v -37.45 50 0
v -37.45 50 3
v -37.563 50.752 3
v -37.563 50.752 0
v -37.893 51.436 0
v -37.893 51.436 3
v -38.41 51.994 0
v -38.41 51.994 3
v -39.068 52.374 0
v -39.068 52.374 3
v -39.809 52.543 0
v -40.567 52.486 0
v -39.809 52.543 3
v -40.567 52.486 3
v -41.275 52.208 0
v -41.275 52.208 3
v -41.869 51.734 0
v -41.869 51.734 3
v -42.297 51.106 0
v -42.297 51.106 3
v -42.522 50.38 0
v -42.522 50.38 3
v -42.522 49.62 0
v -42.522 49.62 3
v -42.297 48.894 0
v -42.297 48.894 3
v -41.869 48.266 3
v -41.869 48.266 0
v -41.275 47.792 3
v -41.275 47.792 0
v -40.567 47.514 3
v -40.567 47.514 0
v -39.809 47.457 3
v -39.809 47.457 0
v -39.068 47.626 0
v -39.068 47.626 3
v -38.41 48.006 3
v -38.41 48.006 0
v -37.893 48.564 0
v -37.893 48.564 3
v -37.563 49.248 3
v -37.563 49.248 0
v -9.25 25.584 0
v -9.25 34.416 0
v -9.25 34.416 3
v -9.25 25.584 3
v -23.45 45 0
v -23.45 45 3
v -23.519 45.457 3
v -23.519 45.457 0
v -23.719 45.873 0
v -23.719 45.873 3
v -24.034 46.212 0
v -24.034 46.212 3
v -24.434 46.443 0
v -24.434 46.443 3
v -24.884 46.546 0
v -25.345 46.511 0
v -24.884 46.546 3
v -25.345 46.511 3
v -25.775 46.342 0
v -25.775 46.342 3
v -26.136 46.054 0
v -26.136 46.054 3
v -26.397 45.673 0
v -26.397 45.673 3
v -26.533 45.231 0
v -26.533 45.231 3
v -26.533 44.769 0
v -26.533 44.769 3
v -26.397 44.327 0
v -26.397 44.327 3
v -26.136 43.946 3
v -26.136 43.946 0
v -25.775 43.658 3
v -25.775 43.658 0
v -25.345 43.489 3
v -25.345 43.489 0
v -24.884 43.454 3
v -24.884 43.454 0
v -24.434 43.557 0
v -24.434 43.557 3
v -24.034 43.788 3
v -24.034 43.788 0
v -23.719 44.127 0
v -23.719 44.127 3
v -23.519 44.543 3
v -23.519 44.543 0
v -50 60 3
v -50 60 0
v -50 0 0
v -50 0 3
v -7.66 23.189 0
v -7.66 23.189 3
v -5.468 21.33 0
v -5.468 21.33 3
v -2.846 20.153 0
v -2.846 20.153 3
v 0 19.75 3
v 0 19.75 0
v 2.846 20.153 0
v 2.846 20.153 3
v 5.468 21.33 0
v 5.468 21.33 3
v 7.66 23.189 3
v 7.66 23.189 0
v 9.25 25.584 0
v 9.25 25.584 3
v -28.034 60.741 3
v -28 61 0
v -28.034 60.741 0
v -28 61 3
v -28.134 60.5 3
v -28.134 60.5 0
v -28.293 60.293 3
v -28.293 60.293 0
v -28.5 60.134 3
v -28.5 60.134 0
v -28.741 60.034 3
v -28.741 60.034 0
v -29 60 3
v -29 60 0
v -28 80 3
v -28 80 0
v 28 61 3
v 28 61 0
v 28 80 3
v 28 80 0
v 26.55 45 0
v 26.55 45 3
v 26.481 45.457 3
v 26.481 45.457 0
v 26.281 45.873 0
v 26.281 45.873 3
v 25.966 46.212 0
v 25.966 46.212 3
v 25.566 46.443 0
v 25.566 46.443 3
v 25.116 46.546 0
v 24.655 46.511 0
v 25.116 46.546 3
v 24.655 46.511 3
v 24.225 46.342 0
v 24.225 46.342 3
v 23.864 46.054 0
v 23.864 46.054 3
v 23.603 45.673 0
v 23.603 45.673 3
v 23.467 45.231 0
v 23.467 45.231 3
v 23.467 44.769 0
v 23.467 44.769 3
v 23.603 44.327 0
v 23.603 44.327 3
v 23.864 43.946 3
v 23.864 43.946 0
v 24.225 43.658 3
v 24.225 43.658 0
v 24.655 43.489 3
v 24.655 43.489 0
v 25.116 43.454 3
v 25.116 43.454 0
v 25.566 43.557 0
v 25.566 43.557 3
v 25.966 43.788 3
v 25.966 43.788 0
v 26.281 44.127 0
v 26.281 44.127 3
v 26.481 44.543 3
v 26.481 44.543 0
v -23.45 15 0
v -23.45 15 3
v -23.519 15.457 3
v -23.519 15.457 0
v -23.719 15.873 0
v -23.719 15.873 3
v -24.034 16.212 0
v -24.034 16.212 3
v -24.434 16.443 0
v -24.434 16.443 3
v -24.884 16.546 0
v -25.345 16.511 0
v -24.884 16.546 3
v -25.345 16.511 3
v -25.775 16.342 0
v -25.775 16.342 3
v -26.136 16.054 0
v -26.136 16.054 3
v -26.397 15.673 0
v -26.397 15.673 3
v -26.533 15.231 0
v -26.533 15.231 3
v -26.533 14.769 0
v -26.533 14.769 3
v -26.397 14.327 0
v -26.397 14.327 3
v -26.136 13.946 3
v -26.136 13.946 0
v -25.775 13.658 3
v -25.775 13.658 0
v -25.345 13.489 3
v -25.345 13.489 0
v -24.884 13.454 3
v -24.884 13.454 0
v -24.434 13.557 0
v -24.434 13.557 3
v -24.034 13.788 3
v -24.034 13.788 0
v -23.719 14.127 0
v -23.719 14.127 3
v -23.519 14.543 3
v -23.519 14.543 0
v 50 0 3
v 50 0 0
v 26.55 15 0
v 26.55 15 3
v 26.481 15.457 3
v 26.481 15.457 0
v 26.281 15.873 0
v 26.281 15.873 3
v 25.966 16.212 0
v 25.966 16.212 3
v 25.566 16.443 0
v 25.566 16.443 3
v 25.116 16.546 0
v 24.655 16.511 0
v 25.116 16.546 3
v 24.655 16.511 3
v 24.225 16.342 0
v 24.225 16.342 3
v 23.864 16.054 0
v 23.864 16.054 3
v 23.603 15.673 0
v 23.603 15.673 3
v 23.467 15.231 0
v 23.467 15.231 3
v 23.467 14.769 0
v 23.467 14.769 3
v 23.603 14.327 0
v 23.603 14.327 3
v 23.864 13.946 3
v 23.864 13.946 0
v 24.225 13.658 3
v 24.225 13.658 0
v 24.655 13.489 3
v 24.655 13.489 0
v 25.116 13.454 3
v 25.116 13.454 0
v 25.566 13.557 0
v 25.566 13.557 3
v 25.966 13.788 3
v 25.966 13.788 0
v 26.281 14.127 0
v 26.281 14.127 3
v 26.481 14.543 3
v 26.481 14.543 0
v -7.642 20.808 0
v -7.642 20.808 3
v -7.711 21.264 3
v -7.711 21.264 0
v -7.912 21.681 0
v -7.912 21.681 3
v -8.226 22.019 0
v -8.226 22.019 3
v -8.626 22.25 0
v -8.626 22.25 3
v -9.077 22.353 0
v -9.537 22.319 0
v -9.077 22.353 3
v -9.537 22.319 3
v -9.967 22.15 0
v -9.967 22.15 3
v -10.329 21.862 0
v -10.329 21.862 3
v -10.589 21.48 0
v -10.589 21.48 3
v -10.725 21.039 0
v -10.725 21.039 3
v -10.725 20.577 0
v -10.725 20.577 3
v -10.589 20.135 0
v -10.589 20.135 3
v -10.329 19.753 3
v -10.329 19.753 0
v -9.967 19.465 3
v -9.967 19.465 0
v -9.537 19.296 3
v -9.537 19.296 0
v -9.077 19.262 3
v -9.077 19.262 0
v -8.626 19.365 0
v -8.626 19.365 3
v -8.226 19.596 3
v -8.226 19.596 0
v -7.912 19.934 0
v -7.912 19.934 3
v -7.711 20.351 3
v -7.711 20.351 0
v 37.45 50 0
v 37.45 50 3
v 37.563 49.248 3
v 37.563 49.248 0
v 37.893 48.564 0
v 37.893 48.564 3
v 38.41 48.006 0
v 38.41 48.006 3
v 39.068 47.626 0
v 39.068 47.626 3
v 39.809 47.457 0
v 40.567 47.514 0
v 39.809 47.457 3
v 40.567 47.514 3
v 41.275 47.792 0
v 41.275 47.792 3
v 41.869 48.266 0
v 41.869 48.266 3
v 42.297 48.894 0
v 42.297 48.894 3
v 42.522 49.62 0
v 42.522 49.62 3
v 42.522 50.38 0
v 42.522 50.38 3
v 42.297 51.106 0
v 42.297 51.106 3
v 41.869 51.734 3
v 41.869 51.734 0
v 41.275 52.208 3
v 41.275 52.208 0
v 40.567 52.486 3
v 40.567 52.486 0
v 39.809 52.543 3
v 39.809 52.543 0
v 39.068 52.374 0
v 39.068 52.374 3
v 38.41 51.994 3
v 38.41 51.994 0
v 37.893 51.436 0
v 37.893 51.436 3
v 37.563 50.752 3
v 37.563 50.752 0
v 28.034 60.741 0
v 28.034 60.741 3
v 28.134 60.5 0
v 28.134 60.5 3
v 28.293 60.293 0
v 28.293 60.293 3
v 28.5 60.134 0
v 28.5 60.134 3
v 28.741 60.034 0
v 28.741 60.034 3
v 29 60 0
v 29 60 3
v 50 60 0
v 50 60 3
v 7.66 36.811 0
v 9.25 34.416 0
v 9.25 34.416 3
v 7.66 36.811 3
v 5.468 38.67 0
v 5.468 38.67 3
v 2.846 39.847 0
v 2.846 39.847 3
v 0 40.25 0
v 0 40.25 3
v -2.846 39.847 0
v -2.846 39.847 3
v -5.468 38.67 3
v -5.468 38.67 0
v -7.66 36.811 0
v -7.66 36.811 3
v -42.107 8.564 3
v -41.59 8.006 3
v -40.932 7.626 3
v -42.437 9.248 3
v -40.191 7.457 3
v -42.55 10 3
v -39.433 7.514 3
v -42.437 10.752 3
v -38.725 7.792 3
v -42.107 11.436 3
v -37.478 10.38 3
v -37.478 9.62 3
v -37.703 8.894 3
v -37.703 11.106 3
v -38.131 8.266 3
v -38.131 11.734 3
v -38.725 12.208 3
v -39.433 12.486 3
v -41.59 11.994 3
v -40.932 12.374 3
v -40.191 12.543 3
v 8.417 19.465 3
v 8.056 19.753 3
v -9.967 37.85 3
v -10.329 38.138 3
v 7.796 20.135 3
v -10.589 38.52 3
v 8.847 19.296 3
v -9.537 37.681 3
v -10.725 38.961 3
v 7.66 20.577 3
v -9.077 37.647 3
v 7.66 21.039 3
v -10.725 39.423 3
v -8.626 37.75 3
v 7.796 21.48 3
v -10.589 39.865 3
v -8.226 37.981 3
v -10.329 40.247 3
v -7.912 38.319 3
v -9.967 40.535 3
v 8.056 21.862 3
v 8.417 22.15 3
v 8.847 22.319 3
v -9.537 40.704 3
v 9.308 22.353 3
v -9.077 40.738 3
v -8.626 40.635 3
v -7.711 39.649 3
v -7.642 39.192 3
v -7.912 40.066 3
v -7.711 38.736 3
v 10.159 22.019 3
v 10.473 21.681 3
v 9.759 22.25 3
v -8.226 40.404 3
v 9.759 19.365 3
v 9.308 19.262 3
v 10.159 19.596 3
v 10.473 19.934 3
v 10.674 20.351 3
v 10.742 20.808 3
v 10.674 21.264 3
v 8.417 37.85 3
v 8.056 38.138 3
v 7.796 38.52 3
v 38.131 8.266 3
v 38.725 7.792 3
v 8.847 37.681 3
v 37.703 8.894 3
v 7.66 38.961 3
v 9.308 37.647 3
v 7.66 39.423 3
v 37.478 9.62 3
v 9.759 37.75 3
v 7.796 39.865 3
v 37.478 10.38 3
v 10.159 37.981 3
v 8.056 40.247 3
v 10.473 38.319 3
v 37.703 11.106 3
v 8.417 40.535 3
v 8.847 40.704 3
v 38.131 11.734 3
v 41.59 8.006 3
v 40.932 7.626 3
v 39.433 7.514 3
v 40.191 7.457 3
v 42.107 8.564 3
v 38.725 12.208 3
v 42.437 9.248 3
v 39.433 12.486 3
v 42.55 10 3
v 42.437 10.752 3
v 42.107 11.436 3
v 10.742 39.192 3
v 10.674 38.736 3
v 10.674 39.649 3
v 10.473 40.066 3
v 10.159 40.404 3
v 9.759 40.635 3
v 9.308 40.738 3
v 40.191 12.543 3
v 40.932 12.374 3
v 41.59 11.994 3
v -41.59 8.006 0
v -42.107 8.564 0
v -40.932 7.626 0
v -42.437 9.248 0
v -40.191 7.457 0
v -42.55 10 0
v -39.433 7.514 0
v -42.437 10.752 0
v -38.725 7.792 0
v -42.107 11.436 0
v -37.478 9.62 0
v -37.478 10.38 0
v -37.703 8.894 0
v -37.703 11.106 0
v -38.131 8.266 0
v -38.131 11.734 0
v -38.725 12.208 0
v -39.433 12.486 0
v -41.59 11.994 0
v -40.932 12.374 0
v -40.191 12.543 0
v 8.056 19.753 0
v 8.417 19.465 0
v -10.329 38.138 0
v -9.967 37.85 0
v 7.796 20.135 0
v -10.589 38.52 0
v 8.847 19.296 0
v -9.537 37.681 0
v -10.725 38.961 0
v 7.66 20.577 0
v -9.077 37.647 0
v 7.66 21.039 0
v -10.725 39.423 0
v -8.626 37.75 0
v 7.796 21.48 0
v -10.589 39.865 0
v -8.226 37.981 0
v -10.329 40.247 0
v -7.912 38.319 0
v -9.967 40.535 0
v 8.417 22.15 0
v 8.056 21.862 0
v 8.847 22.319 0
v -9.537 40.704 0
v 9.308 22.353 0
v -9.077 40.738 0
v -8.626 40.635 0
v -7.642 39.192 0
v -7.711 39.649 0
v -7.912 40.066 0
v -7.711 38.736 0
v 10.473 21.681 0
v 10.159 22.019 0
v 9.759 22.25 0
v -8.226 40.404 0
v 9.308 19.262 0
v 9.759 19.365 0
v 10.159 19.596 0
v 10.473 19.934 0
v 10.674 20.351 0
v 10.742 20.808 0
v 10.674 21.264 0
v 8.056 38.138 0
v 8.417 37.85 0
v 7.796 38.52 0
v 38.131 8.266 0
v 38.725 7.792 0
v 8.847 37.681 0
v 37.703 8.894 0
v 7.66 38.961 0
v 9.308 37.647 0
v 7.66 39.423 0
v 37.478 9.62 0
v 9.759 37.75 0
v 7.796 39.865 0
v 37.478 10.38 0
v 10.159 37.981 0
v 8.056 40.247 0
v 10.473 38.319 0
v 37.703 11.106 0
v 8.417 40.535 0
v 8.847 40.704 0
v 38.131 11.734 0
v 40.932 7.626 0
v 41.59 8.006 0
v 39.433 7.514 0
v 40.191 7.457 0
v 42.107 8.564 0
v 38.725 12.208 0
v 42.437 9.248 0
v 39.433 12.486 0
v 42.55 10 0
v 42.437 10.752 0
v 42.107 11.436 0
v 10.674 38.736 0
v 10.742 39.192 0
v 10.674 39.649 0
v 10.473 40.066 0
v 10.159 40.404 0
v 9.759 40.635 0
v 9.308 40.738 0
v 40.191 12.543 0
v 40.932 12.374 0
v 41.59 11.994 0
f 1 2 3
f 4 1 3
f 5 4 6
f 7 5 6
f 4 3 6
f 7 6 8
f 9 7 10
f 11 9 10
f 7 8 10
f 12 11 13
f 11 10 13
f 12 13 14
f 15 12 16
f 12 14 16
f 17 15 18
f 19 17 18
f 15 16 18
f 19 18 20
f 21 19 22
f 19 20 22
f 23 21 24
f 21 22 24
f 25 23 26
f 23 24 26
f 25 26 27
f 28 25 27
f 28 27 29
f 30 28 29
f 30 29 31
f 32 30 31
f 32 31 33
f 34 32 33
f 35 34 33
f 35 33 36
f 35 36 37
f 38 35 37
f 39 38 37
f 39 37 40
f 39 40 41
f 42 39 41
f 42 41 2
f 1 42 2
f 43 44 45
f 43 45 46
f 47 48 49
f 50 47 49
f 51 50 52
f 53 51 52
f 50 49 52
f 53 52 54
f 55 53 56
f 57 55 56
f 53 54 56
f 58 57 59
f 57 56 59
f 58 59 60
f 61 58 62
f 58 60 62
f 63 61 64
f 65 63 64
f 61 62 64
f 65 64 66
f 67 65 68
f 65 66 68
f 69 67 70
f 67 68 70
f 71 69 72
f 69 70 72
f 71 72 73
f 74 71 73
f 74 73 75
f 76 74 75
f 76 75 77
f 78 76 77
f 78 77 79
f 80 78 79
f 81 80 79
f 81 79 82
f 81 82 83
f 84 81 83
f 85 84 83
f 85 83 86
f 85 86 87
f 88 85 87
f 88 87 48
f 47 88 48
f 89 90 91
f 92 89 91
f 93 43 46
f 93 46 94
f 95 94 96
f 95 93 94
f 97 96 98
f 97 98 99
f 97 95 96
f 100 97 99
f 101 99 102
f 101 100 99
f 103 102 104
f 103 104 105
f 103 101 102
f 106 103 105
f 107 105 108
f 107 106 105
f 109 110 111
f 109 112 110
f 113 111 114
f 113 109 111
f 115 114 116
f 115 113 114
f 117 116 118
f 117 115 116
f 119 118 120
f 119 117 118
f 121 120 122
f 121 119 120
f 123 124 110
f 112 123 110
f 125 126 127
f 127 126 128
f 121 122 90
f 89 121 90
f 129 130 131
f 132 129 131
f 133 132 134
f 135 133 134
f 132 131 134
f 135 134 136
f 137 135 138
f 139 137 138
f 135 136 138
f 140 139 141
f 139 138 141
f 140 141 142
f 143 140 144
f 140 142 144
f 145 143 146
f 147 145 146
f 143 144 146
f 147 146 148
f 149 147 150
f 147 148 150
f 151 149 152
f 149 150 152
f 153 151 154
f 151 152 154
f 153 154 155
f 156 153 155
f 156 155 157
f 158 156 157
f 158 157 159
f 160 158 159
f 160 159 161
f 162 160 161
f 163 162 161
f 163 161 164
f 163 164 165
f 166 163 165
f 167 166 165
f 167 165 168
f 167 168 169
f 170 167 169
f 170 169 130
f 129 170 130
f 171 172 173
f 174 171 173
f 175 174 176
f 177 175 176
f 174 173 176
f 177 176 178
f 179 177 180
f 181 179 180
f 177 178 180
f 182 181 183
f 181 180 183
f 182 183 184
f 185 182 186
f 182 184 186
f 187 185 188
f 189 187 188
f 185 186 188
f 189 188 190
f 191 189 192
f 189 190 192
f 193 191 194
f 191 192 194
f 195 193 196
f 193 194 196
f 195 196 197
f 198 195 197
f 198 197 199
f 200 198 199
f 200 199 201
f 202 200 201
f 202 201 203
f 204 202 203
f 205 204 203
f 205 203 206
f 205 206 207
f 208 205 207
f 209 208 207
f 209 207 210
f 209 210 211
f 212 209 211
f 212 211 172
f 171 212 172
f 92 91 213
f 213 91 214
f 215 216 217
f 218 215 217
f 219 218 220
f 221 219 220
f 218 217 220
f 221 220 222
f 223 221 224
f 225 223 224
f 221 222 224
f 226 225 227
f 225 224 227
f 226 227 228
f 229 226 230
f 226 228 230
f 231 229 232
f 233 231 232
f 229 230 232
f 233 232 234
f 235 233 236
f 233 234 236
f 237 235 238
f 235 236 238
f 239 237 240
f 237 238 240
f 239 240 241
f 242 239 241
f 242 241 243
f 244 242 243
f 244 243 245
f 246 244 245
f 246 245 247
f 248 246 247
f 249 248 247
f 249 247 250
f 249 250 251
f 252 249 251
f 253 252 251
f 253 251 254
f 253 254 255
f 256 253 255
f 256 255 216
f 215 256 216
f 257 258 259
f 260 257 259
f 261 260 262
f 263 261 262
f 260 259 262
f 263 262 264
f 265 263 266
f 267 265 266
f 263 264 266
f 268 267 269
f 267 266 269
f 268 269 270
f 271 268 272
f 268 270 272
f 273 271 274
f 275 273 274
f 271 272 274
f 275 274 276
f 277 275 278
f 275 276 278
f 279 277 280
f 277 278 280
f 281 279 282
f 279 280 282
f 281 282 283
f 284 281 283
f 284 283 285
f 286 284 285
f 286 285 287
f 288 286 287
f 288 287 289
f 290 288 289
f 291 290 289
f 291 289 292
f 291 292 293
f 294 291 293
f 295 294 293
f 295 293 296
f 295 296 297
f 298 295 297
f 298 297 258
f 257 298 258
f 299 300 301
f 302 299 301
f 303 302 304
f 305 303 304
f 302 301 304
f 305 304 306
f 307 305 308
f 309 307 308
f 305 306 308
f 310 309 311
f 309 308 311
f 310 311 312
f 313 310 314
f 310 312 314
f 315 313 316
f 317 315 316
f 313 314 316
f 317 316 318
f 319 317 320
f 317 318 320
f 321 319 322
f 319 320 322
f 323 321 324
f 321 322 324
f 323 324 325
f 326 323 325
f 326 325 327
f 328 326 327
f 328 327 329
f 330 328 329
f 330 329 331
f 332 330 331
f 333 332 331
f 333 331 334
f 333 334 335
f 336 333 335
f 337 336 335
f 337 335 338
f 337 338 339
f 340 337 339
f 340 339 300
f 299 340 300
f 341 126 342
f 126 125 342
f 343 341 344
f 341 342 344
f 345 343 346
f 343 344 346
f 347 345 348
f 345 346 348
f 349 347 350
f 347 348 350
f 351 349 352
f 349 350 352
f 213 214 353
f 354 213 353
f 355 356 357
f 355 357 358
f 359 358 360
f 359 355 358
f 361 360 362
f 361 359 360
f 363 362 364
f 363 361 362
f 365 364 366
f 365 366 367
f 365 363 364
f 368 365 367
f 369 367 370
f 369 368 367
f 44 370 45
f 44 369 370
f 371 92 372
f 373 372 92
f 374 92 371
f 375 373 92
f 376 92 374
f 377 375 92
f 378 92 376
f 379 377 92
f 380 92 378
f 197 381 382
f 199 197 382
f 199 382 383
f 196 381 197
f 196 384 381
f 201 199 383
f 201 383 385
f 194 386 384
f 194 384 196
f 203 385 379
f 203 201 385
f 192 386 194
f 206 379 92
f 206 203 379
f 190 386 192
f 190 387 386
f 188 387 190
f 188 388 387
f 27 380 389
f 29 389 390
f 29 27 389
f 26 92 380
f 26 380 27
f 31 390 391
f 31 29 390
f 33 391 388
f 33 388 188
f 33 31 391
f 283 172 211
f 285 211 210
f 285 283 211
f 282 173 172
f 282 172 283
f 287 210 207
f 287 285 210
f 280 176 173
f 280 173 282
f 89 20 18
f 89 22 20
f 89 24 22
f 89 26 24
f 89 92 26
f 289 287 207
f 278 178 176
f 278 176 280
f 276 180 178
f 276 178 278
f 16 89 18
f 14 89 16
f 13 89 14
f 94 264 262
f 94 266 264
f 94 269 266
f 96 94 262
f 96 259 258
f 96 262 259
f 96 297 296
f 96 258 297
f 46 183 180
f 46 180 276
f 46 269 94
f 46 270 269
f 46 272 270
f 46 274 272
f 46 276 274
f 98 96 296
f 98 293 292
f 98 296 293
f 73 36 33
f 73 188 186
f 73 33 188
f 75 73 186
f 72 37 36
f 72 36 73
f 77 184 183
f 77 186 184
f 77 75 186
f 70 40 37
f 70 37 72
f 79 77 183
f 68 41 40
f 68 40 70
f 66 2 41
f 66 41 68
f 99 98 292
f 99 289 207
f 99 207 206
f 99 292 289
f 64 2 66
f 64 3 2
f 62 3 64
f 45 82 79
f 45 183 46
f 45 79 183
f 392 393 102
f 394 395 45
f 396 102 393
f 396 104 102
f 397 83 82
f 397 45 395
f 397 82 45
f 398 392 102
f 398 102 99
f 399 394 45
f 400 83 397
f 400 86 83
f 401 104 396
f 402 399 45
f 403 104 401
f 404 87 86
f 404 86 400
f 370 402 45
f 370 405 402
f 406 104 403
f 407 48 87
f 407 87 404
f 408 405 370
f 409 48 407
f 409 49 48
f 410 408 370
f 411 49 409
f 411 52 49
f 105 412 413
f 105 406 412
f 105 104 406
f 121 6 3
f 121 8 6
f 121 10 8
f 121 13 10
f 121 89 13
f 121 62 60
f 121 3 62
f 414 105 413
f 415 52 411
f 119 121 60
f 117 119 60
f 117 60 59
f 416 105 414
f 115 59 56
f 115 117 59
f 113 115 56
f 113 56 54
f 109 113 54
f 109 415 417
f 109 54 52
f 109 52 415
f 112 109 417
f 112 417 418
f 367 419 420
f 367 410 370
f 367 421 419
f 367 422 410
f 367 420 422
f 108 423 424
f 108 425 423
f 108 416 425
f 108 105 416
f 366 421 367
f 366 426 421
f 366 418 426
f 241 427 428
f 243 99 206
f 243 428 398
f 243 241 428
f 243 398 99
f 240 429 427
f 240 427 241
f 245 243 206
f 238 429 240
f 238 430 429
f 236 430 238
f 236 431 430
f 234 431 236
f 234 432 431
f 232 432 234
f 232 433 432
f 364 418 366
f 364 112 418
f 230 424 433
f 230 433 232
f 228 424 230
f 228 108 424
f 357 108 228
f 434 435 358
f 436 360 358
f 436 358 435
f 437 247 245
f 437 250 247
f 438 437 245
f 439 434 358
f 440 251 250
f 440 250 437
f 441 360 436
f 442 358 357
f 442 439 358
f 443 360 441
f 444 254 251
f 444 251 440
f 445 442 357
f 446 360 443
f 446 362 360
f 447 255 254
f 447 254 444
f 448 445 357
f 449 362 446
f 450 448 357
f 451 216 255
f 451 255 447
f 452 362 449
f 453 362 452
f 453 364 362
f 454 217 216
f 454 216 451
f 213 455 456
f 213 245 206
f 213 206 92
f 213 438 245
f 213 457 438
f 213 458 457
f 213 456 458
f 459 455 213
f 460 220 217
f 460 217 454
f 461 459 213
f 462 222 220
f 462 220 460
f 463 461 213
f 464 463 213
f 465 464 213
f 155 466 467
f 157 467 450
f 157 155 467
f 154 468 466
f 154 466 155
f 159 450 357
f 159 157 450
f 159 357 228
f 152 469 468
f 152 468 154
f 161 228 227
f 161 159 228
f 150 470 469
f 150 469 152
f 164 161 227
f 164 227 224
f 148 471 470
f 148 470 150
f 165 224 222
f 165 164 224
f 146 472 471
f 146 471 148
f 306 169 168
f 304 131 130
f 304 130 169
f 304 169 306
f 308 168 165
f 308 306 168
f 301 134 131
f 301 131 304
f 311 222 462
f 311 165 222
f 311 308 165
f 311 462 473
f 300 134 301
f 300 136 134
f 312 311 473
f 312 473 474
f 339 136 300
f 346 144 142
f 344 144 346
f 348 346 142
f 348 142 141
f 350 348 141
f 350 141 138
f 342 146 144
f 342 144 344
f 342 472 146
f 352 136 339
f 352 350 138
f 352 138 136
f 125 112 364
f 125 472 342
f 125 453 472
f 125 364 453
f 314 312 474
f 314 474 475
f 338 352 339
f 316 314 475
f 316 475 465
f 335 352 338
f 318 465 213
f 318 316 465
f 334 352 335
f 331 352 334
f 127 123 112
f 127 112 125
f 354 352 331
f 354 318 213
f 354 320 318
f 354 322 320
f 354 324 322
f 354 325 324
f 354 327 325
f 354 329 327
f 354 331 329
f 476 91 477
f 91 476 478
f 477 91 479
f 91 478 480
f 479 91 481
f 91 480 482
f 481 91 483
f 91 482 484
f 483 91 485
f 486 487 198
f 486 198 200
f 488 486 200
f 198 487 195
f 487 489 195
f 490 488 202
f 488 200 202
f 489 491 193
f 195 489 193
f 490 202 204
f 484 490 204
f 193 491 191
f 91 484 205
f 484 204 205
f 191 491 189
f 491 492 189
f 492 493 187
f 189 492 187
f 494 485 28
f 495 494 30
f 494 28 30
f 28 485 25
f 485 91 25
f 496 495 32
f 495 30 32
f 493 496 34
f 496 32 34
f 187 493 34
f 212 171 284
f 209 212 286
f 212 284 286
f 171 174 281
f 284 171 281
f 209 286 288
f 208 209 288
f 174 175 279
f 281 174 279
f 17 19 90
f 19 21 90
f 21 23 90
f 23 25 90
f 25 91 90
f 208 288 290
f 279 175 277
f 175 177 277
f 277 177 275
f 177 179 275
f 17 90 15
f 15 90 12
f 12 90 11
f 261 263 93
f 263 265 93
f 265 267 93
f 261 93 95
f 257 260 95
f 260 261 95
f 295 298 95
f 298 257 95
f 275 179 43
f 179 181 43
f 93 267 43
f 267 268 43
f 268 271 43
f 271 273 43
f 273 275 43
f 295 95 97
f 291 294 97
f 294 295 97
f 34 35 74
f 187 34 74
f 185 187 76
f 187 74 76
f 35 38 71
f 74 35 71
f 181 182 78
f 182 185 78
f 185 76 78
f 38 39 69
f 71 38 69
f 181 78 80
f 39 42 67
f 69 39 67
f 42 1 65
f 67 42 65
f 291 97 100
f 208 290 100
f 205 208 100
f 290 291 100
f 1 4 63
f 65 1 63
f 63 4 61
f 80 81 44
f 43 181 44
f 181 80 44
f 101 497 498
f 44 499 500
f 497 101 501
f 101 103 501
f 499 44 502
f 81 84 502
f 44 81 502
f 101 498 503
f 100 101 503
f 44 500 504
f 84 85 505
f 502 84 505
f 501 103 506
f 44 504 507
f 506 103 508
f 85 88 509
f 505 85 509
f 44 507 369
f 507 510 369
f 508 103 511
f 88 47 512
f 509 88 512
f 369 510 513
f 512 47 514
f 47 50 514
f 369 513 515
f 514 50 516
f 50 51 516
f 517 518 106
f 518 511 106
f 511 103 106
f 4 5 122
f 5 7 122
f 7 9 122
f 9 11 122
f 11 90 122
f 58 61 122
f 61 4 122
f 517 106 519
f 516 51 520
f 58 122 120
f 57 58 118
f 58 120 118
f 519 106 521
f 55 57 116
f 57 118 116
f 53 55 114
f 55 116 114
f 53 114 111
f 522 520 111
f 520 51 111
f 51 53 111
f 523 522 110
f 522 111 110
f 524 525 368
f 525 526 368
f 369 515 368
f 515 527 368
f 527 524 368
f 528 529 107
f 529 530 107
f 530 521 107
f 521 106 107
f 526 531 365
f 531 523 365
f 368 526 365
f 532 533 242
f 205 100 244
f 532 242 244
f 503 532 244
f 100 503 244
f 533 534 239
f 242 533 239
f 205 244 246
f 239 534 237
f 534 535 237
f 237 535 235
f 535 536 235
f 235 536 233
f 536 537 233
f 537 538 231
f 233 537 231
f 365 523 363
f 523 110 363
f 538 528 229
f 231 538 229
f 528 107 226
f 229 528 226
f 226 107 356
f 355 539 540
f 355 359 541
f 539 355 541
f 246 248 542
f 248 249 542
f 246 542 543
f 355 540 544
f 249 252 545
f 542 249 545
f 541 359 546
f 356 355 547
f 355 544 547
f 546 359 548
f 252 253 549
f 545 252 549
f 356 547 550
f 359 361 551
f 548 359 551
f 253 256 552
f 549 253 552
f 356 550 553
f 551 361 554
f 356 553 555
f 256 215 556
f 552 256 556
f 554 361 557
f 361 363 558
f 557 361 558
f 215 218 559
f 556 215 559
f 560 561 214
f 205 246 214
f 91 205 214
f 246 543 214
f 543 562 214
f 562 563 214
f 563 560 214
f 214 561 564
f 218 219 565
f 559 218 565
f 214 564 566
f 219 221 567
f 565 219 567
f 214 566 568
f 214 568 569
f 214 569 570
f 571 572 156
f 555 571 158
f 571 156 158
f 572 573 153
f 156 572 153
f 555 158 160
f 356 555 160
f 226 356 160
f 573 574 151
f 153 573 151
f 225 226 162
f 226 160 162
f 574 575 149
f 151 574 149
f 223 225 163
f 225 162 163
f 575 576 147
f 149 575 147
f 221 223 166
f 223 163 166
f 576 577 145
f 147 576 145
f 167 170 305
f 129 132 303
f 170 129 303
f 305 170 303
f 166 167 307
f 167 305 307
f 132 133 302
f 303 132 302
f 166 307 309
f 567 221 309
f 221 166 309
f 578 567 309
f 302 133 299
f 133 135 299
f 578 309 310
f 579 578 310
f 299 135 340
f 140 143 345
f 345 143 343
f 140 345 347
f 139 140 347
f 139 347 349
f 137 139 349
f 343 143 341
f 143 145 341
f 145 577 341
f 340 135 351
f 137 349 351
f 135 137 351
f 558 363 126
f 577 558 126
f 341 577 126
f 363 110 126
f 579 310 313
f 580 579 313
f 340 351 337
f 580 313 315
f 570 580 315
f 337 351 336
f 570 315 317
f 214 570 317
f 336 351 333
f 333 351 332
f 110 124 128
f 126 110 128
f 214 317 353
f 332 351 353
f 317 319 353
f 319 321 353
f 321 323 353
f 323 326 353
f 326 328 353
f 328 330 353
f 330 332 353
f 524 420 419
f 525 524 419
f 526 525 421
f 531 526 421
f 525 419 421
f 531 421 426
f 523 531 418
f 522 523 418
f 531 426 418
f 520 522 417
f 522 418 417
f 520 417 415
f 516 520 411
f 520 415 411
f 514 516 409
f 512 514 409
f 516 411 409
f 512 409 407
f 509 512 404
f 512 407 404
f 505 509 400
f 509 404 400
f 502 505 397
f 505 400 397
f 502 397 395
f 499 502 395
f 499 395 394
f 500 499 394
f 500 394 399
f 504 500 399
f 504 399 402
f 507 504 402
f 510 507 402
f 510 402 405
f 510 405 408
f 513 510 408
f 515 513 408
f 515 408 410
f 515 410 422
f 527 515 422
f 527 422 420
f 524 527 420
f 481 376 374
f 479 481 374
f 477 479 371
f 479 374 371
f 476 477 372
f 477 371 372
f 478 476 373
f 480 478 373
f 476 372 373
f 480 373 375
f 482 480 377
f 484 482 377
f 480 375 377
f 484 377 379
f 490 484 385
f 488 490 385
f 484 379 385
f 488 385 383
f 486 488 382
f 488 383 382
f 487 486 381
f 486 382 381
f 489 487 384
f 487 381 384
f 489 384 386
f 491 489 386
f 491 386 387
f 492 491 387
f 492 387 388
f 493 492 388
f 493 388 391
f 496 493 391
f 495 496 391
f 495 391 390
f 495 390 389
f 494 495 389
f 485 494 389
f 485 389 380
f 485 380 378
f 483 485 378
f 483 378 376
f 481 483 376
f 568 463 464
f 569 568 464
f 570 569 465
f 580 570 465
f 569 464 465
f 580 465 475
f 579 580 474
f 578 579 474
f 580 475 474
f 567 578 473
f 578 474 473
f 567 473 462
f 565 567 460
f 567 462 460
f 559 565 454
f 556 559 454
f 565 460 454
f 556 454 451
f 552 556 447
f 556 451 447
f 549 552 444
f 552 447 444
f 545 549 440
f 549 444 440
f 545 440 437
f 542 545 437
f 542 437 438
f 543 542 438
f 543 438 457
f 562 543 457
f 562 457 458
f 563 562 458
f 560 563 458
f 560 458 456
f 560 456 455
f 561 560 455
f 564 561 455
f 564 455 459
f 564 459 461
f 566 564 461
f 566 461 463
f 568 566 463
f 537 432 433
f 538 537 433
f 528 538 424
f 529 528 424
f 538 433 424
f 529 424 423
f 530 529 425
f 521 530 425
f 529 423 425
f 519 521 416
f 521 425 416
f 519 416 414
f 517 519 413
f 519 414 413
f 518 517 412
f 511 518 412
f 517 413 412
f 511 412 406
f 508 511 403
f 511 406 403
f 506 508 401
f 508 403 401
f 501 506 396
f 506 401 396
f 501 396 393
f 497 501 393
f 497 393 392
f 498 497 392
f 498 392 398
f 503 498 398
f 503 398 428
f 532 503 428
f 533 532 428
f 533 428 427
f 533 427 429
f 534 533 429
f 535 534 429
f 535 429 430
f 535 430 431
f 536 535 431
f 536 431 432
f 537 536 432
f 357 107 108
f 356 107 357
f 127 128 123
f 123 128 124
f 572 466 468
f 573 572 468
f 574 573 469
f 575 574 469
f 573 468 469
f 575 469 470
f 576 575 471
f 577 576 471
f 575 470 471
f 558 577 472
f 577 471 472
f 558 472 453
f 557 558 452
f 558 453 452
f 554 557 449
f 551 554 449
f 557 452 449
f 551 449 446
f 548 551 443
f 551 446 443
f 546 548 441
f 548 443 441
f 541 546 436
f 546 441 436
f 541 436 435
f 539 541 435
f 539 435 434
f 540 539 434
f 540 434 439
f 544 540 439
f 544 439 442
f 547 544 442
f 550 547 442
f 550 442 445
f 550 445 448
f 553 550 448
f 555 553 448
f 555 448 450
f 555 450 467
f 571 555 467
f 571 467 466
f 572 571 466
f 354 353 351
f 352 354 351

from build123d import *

# Parameters (mm, degrees)
EXTRUDE_1_DEPTH     = 3
SKETCH_2_R          = 1.55
CUT_EXTRUDE_1_DEPTH = 95.387499172
FILLET_1_R          = 1
SKETCH_3_R          = 2.55
CUT_EXTRUDE_2_DEPTH = 95.387499172
SKETCH_4_R          = 1.55
CUT_EXTRUDE_3_DEPTH = 95.387499172


with BuildPart() as part:
    # ｽｹｯﾁ1 → ﾎﾞｽ - 押し出し1 (new body)
    with BuildSketch(Plane.XY):
        Polygon((-28, 80), (-28, 60), (-50, 60), (-50, 0), (50, 0), (50, 60), (28, 60), (28, 80), align=None)
        with BuildLine():
            Line((-9.25, 34.415880433), (-9.25, 25.584119567))
            ThreePointArc((-9.25, 25.584119567), (0, 19.75), (9.25, 25.584119567))
            Line((9.25, 25.584119567), (9.25, 34.415880433))
            ThreePointArc((9.25, 34.415880433), (0, 40.25), (-9.25, 34.415880433))
        make_face(mode=Mode.SUBTRACT)
    extrude(amount=EXTRUDE_1_DEPTH)

    # ｽｹｯﾁ2 → ｶｯﾄ - 押し出し1 (cut, through all)
    with BuildSketch(Plane.XY.offset(3)):
        with Locations((-9.192388155, 39.192388155)):
            Circle(SKETCH_2_R)
        with Locations((9.192388155, 39.192388155)):
            Circle(SKETCH_2_R)
        with Locations((9.192388155, 20.807611845)):
            Circle(SKETCH_2_R)
        with Locations((-9.192388155, 20.807611845)):
            Circle(SKETCH_2_R)
    extrude(amount=-CUT_EXTRUDE_1_DEPTH, mode=Mode.SUBTRACT)

    # ﾌｨﾚｯﾄ1
    fillet_1_edges = [part.edges().sort_by_distance(p)[0] for p in [
        (28, 60, 1.5),
        (-28, 60, 1.5),
    ]]
    fillet(fillet_1_edges, radius=FILLET_1_R)

    # ｽｹｯﾁ3 → ｶｯﾄ - 押し出し2 (cut, through all)
    with BuildSketch(Plane.XY.offset(3)):
        with Locations((-40, 50)):
            Circle(SKETCH_3_R)
        with Locations(Location((-40, 10, 0), (0, 0, 180))):
            Circle(SKETCH_3_R)
        with Locations((40, 10)):
            Circle(SKETCH_3_R)
        with Locations(Location((40, 50, 0), (0, 0, 180))):
            Circle(SKETCH_3_R)
    extrude(amount=-CUT_EXTRUDE_2_DEPTH, mode=Mode.SUBTRACT)

    # ｽｹｯﾁ4 → ｶｯﾄ - 押し出し3 (cut, through all)
    with BuildSketch(Plane.XY.offset(3)):
        with Locations((25, 45)):
            Circle(SKETCH_4_R)
        with Locations((25, 15)):
            Circle(SKETCH_4_R)
        with Locations((-25, 15)):
            Circle(SKETCH_4_R)
        with Locations((-25, 45)):
            Circle(SKETCH_4_R)
    extrude(amount=-CUT_EXTRUDE_3_DEPTH, mode=Mode.SUBTRACT)


solid = part.part
